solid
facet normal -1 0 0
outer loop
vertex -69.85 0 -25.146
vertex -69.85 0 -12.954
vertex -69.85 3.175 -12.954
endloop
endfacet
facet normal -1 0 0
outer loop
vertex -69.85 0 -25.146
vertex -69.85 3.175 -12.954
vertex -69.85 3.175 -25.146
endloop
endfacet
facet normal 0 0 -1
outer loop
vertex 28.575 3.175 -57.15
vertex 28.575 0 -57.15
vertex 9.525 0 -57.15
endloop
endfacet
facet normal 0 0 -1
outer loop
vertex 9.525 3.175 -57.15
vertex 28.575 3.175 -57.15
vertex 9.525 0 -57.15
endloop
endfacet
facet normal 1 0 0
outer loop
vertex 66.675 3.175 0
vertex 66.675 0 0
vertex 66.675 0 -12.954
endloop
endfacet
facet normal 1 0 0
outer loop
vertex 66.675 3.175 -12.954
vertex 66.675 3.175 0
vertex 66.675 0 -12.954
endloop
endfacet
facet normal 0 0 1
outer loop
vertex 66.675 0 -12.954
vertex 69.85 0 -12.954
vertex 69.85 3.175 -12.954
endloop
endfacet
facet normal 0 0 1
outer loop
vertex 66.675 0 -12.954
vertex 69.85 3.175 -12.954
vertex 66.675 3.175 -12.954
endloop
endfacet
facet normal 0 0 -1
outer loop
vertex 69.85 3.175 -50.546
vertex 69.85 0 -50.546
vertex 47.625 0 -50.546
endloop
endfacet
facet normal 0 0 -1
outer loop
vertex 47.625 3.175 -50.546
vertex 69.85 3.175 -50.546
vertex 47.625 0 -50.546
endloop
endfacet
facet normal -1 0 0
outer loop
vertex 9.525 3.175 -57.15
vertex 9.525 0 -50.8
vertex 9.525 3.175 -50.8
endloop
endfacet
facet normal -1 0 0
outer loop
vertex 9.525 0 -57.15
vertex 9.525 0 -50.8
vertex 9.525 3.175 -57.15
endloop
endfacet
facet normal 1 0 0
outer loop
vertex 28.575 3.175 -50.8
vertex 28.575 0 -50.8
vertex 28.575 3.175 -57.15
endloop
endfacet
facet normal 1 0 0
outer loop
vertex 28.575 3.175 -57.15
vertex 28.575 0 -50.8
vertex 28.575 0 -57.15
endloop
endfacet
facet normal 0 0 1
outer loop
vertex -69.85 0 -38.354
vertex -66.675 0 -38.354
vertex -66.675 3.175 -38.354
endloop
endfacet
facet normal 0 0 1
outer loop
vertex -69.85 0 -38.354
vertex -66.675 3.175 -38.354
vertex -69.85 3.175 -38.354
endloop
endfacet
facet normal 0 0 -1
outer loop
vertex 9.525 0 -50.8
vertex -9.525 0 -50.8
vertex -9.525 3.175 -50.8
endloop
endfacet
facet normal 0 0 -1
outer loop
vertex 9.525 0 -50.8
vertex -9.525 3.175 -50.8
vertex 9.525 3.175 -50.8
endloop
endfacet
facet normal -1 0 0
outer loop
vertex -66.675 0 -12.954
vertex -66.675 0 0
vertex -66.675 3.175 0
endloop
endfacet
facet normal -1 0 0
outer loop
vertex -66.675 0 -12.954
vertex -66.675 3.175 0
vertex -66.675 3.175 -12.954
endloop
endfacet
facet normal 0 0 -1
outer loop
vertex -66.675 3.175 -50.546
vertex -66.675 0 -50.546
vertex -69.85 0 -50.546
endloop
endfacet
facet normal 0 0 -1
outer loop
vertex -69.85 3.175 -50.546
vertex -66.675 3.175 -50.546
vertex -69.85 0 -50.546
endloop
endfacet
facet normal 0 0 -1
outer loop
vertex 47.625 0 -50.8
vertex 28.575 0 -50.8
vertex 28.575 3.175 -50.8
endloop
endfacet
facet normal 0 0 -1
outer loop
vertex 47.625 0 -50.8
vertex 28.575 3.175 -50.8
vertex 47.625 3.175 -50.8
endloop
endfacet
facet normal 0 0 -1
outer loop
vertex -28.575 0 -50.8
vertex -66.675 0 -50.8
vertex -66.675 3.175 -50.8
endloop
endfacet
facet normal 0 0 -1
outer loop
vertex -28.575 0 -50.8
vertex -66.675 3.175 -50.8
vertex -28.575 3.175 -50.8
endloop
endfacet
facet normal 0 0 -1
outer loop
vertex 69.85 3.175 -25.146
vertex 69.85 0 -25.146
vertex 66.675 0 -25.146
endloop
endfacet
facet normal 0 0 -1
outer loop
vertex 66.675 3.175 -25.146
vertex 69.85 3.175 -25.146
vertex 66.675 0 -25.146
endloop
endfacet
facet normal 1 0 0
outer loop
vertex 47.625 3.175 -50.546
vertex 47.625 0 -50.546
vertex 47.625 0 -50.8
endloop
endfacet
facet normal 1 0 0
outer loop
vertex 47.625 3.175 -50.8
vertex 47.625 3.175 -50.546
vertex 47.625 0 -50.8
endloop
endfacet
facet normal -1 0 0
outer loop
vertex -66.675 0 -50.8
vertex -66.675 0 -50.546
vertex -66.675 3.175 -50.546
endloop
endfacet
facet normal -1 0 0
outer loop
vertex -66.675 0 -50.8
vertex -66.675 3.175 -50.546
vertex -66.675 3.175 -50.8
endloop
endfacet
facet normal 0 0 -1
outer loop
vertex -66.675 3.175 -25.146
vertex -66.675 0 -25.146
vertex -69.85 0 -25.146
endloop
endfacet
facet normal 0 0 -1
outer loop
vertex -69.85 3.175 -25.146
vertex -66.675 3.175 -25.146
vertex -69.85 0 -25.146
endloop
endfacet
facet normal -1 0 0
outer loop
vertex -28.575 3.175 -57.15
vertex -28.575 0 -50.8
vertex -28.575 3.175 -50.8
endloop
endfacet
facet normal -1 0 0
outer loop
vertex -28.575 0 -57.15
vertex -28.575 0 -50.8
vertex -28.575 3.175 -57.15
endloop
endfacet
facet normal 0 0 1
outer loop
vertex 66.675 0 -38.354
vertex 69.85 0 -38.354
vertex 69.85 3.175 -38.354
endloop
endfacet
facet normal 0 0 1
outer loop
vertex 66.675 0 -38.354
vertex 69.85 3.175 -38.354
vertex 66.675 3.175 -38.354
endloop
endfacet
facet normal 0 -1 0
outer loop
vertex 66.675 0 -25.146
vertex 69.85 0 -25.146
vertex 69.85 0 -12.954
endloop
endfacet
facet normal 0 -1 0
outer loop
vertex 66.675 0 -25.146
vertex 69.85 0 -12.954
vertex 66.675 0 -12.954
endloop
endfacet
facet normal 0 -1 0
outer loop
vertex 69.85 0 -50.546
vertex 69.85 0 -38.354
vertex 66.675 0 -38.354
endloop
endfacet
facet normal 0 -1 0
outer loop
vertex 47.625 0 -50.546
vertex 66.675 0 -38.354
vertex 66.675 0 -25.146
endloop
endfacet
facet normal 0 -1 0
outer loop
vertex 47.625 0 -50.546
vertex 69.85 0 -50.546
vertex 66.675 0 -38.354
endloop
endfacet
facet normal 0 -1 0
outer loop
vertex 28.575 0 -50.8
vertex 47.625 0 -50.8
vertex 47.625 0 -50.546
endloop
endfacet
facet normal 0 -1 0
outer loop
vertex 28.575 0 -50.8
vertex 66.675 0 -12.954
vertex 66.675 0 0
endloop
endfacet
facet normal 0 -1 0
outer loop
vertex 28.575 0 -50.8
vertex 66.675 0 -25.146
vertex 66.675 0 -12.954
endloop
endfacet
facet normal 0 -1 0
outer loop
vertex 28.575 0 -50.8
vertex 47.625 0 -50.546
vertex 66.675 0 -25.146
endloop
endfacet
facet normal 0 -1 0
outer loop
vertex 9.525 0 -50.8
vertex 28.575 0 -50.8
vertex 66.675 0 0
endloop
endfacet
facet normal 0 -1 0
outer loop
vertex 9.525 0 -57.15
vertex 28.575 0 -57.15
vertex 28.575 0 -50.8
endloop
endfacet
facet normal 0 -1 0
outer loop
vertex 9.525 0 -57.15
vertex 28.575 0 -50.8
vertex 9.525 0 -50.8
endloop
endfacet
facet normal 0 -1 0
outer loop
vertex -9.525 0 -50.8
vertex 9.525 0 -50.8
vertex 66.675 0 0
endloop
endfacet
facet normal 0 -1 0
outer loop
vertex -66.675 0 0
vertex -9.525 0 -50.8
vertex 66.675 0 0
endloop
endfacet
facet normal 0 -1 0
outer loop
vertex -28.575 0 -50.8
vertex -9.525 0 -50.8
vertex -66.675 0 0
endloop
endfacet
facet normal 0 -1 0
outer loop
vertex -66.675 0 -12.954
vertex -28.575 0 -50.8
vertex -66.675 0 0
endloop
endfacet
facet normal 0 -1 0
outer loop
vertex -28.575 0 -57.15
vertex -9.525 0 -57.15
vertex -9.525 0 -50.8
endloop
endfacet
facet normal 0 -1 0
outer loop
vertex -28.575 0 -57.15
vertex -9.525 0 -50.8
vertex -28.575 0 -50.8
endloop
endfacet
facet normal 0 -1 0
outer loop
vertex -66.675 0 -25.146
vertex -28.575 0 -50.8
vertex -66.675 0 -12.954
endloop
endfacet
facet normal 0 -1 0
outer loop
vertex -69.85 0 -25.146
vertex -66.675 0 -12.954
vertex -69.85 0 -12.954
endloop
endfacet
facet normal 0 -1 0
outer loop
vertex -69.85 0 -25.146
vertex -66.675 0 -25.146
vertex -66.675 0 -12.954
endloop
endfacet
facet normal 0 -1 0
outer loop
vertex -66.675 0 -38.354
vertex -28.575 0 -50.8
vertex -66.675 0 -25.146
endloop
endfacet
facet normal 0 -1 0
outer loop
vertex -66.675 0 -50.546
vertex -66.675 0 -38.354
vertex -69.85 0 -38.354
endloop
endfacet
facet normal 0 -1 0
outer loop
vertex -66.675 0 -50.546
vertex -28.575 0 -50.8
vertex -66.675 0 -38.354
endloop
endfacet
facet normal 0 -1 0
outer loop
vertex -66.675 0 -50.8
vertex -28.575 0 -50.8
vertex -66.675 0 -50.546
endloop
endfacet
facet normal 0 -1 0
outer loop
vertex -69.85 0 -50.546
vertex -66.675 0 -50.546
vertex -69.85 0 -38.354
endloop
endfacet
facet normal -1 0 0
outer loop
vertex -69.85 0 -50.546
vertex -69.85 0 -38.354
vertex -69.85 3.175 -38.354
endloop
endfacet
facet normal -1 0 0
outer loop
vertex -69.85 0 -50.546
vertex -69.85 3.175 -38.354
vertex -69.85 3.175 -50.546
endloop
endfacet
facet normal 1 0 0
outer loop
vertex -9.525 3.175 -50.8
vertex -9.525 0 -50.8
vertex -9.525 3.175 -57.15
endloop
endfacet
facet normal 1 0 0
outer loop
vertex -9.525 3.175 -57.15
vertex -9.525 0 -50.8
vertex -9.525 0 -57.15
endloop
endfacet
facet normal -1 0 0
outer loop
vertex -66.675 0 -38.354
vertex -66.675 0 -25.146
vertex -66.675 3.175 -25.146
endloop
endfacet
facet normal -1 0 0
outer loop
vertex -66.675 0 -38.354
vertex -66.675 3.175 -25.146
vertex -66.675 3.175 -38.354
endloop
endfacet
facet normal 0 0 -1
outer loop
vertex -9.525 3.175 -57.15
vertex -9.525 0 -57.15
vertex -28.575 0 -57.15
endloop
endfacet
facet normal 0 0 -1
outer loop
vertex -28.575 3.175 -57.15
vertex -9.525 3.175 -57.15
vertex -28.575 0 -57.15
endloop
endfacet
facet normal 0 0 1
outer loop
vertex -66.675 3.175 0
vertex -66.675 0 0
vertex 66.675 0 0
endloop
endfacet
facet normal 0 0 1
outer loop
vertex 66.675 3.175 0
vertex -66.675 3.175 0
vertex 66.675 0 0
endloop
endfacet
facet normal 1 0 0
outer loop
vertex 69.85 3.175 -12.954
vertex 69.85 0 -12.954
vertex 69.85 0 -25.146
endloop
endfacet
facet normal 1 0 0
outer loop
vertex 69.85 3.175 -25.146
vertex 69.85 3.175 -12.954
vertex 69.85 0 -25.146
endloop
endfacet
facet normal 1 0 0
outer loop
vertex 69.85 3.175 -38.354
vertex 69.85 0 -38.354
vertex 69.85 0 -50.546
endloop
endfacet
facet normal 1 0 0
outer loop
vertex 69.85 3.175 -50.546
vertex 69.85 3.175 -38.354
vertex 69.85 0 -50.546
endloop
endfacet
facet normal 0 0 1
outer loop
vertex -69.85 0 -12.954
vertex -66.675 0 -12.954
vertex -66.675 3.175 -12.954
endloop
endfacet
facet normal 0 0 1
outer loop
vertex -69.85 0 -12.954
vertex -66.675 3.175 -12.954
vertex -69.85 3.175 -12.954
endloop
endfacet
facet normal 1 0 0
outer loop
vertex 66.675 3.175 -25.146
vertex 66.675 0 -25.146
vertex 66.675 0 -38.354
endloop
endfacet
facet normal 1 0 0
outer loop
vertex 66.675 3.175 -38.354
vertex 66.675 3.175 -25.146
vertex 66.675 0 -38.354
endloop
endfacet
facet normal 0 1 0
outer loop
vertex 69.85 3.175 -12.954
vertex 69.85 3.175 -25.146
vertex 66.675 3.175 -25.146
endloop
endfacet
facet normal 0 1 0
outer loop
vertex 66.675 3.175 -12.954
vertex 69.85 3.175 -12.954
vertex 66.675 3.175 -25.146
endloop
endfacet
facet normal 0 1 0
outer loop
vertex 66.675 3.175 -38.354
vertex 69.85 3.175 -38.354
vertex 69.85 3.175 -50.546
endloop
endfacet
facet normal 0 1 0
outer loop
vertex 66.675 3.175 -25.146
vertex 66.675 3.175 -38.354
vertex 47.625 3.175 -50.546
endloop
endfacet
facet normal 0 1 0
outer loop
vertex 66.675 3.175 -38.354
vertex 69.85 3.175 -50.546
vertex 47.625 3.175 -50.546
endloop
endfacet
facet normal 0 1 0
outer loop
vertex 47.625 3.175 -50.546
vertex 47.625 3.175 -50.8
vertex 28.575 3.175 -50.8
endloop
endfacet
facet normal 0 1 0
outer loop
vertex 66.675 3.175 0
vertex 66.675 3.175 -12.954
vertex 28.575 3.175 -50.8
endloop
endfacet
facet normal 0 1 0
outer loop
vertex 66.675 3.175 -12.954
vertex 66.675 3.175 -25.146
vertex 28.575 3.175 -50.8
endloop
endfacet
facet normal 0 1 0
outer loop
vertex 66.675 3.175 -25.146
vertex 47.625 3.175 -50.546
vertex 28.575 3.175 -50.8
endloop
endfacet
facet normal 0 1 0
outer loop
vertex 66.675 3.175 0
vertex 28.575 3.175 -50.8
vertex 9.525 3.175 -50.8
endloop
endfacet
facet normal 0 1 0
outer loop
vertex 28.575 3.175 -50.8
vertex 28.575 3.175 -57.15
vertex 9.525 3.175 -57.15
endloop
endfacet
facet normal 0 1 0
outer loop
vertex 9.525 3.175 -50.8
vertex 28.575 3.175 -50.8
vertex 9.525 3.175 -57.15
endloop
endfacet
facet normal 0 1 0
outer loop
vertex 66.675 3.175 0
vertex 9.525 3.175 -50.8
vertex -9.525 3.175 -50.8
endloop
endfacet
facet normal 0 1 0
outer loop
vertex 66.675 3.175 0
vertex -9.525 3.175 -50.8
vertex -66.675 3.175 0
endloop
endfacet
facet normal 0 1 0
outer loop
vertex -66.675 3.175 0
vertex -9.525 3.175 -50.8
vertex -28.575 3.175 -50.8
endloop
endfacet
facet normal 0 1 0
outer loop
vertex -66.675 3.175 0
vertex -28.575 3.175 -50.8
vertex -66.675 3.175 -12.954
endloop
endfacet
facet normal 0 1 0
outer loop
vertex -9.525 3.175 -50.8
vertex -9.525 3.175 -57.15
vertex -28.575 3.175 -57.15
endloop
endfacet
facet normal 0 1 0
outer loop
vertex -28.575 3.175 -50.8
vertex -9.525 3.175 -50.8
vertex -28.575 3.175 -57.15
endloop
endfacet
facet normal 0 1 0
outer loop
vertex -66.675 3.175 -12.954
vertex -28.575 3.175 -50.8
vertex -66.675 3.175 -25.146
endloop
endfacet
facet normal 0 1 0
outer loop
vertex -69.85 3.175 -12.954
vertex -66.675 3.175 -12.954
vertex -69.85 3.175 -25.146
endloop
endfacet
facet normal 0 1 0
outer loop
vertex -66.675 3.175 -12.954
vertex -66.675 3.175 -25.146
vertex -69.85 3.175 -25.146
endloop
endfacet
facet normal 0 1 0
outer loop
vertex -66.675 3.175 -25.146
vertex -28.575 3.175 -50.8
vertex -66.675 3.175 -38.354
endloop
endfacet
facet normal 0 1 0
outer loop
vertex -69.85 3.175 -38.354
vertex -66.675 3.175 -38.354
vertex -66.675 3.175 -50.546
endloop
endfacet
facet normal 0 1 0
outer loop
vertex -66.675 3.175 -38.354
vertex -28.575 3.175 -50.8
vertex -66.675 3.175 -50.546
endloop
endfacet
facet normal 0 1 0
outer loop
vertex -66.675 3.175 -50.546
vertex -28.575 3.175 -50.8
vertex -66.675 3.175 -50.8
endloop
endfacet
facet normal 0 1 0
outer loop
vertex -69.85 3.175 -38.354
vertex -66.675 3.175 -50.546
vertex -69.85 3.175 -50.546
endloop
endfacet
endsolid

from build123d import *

# Parameters (mm, degrees)
SKETCH1_W           = 133.35
SKETCH1_H           = 101.6
BOSS_EXTRUDE1_DEPTH = 3.175
SKETCH2_W           = 3.175
SKETCH2_H           = 12.192
SKETCH2_W_2         = 19.05
SKETCH2_H_2         = 6.35
BOSS_EXTRUDE2_DEPTH = 3.175
SKETCH3_W           = 19.05
SKETCH3_H           = 6.35
SKETCH3_H_2         = 6.604
CUT_EXTRUDE1_DEPTH  = 91.306287849
SKETCH4_W           = 202.264069455
SKETCH4_H           = 60.449375303
CUT_EXTRUDE2_DEPTH  = 91.306287849


with BuildPart() as part:
    # Sketch1 → Boss-Extrude1 (new body)
    with BuildSketch(Plane(origin=(0, 0, 0), x_dir=(1, 0, 0), z_dir=(0, 1, 0))):
        Rectangle(SKETCH1_W, SKETCH1_H)
    extrude(amount=BOSS_EXTRUDE1_DEPTH)

    # Sketch2 → Boss-Extrude2 (add)
    with BuildSketch(Plane(origin=(0, 0, 0), x_dir=(-1, 0, 0), z_dir=(0, -1, 0))):
        with Locations((68.2625, -31.75)):
            Rectangle(SKETCH2_W, SKETCH2_H)
        with Locations((68.2625, -6.35)):
            Rectangle(SKETCH2_W, SKETCH2_H)
        with Locations((68.2625, 19.05)):
            Rectangle(SKETCH2_W, SKETCH2_H)
        with Locations((68.2625, 44.45)):
            Rectangle(SKETCH2_W, SKETCH2_H)
        with Locations((-68.2625, 44.45)):
            Rectangle(SKETCH2_W, SKETCH2_H)
        with Locations((-68.2625, 19.05)):
            Rectangle(SKETCH2_W, SKETCH2_H)
        with Locations((-68.2625, -6.35)):
            Rectangle(SKETCH2_W, SKETCH2_H)
        with Locations((-68.2625, -31.75)):
            Rectangle(SKETCH2_W, SKETCH2_H)
        with Locations((19.05, 53.975)):
            Rectangle(SKETCH2_W_2, SKETCH2_H_2)
        with Locations((57.15, 53.975)):
            Rectangle(SKETCH2_W_2, SKETCH2_H_2)
        with Locations((-19.05, 53.975)):
            Rectangle(SKETCH2_W_2, SKETCH2_H_2)
        with Locations((-57.15, 53.975)):
            Rectangle(SKETCH2_W_2, SKETCH2_H_2)
    extrude(amount=-BOSS_EXTRUDE2_DEPTH)

    # Sketch3 → Cut-Extrude1 (cut, through all)
    with BuildSketch(Plane(origin=(0, 0, 0), x_dir=(1, 0, 0), z_dir=(0, 1, 0))):
        with Locations((-57.15, 53.975)):
            Rectangle(SKETCH3_W, SKETCH3_H)
        with Locations((57.15, 53.848)):
            Rectangle(SKETCH3_W, SKETCH3_H_2)
    extrude(amount=CUT_EXTRUDE1_DEPTH, mode=Mode.SUBTRACT)

    # Sketch4 → Cut-Extrude2 (cut, through all)
    with BuildSketch(Plane(origin=(0, 0, 0), x_dir=(1, 0, 0), z_dir=(0, 1, 0))):
        with Locations((4.022296835, -30.224687652)):
            Rectangle(SKETCH4_W, SKETCH4_H)
    extrude(amount=CUT_EXTRUDE2_DEPTH, mode=Mode.SUBTRACT)


solid = part.part
